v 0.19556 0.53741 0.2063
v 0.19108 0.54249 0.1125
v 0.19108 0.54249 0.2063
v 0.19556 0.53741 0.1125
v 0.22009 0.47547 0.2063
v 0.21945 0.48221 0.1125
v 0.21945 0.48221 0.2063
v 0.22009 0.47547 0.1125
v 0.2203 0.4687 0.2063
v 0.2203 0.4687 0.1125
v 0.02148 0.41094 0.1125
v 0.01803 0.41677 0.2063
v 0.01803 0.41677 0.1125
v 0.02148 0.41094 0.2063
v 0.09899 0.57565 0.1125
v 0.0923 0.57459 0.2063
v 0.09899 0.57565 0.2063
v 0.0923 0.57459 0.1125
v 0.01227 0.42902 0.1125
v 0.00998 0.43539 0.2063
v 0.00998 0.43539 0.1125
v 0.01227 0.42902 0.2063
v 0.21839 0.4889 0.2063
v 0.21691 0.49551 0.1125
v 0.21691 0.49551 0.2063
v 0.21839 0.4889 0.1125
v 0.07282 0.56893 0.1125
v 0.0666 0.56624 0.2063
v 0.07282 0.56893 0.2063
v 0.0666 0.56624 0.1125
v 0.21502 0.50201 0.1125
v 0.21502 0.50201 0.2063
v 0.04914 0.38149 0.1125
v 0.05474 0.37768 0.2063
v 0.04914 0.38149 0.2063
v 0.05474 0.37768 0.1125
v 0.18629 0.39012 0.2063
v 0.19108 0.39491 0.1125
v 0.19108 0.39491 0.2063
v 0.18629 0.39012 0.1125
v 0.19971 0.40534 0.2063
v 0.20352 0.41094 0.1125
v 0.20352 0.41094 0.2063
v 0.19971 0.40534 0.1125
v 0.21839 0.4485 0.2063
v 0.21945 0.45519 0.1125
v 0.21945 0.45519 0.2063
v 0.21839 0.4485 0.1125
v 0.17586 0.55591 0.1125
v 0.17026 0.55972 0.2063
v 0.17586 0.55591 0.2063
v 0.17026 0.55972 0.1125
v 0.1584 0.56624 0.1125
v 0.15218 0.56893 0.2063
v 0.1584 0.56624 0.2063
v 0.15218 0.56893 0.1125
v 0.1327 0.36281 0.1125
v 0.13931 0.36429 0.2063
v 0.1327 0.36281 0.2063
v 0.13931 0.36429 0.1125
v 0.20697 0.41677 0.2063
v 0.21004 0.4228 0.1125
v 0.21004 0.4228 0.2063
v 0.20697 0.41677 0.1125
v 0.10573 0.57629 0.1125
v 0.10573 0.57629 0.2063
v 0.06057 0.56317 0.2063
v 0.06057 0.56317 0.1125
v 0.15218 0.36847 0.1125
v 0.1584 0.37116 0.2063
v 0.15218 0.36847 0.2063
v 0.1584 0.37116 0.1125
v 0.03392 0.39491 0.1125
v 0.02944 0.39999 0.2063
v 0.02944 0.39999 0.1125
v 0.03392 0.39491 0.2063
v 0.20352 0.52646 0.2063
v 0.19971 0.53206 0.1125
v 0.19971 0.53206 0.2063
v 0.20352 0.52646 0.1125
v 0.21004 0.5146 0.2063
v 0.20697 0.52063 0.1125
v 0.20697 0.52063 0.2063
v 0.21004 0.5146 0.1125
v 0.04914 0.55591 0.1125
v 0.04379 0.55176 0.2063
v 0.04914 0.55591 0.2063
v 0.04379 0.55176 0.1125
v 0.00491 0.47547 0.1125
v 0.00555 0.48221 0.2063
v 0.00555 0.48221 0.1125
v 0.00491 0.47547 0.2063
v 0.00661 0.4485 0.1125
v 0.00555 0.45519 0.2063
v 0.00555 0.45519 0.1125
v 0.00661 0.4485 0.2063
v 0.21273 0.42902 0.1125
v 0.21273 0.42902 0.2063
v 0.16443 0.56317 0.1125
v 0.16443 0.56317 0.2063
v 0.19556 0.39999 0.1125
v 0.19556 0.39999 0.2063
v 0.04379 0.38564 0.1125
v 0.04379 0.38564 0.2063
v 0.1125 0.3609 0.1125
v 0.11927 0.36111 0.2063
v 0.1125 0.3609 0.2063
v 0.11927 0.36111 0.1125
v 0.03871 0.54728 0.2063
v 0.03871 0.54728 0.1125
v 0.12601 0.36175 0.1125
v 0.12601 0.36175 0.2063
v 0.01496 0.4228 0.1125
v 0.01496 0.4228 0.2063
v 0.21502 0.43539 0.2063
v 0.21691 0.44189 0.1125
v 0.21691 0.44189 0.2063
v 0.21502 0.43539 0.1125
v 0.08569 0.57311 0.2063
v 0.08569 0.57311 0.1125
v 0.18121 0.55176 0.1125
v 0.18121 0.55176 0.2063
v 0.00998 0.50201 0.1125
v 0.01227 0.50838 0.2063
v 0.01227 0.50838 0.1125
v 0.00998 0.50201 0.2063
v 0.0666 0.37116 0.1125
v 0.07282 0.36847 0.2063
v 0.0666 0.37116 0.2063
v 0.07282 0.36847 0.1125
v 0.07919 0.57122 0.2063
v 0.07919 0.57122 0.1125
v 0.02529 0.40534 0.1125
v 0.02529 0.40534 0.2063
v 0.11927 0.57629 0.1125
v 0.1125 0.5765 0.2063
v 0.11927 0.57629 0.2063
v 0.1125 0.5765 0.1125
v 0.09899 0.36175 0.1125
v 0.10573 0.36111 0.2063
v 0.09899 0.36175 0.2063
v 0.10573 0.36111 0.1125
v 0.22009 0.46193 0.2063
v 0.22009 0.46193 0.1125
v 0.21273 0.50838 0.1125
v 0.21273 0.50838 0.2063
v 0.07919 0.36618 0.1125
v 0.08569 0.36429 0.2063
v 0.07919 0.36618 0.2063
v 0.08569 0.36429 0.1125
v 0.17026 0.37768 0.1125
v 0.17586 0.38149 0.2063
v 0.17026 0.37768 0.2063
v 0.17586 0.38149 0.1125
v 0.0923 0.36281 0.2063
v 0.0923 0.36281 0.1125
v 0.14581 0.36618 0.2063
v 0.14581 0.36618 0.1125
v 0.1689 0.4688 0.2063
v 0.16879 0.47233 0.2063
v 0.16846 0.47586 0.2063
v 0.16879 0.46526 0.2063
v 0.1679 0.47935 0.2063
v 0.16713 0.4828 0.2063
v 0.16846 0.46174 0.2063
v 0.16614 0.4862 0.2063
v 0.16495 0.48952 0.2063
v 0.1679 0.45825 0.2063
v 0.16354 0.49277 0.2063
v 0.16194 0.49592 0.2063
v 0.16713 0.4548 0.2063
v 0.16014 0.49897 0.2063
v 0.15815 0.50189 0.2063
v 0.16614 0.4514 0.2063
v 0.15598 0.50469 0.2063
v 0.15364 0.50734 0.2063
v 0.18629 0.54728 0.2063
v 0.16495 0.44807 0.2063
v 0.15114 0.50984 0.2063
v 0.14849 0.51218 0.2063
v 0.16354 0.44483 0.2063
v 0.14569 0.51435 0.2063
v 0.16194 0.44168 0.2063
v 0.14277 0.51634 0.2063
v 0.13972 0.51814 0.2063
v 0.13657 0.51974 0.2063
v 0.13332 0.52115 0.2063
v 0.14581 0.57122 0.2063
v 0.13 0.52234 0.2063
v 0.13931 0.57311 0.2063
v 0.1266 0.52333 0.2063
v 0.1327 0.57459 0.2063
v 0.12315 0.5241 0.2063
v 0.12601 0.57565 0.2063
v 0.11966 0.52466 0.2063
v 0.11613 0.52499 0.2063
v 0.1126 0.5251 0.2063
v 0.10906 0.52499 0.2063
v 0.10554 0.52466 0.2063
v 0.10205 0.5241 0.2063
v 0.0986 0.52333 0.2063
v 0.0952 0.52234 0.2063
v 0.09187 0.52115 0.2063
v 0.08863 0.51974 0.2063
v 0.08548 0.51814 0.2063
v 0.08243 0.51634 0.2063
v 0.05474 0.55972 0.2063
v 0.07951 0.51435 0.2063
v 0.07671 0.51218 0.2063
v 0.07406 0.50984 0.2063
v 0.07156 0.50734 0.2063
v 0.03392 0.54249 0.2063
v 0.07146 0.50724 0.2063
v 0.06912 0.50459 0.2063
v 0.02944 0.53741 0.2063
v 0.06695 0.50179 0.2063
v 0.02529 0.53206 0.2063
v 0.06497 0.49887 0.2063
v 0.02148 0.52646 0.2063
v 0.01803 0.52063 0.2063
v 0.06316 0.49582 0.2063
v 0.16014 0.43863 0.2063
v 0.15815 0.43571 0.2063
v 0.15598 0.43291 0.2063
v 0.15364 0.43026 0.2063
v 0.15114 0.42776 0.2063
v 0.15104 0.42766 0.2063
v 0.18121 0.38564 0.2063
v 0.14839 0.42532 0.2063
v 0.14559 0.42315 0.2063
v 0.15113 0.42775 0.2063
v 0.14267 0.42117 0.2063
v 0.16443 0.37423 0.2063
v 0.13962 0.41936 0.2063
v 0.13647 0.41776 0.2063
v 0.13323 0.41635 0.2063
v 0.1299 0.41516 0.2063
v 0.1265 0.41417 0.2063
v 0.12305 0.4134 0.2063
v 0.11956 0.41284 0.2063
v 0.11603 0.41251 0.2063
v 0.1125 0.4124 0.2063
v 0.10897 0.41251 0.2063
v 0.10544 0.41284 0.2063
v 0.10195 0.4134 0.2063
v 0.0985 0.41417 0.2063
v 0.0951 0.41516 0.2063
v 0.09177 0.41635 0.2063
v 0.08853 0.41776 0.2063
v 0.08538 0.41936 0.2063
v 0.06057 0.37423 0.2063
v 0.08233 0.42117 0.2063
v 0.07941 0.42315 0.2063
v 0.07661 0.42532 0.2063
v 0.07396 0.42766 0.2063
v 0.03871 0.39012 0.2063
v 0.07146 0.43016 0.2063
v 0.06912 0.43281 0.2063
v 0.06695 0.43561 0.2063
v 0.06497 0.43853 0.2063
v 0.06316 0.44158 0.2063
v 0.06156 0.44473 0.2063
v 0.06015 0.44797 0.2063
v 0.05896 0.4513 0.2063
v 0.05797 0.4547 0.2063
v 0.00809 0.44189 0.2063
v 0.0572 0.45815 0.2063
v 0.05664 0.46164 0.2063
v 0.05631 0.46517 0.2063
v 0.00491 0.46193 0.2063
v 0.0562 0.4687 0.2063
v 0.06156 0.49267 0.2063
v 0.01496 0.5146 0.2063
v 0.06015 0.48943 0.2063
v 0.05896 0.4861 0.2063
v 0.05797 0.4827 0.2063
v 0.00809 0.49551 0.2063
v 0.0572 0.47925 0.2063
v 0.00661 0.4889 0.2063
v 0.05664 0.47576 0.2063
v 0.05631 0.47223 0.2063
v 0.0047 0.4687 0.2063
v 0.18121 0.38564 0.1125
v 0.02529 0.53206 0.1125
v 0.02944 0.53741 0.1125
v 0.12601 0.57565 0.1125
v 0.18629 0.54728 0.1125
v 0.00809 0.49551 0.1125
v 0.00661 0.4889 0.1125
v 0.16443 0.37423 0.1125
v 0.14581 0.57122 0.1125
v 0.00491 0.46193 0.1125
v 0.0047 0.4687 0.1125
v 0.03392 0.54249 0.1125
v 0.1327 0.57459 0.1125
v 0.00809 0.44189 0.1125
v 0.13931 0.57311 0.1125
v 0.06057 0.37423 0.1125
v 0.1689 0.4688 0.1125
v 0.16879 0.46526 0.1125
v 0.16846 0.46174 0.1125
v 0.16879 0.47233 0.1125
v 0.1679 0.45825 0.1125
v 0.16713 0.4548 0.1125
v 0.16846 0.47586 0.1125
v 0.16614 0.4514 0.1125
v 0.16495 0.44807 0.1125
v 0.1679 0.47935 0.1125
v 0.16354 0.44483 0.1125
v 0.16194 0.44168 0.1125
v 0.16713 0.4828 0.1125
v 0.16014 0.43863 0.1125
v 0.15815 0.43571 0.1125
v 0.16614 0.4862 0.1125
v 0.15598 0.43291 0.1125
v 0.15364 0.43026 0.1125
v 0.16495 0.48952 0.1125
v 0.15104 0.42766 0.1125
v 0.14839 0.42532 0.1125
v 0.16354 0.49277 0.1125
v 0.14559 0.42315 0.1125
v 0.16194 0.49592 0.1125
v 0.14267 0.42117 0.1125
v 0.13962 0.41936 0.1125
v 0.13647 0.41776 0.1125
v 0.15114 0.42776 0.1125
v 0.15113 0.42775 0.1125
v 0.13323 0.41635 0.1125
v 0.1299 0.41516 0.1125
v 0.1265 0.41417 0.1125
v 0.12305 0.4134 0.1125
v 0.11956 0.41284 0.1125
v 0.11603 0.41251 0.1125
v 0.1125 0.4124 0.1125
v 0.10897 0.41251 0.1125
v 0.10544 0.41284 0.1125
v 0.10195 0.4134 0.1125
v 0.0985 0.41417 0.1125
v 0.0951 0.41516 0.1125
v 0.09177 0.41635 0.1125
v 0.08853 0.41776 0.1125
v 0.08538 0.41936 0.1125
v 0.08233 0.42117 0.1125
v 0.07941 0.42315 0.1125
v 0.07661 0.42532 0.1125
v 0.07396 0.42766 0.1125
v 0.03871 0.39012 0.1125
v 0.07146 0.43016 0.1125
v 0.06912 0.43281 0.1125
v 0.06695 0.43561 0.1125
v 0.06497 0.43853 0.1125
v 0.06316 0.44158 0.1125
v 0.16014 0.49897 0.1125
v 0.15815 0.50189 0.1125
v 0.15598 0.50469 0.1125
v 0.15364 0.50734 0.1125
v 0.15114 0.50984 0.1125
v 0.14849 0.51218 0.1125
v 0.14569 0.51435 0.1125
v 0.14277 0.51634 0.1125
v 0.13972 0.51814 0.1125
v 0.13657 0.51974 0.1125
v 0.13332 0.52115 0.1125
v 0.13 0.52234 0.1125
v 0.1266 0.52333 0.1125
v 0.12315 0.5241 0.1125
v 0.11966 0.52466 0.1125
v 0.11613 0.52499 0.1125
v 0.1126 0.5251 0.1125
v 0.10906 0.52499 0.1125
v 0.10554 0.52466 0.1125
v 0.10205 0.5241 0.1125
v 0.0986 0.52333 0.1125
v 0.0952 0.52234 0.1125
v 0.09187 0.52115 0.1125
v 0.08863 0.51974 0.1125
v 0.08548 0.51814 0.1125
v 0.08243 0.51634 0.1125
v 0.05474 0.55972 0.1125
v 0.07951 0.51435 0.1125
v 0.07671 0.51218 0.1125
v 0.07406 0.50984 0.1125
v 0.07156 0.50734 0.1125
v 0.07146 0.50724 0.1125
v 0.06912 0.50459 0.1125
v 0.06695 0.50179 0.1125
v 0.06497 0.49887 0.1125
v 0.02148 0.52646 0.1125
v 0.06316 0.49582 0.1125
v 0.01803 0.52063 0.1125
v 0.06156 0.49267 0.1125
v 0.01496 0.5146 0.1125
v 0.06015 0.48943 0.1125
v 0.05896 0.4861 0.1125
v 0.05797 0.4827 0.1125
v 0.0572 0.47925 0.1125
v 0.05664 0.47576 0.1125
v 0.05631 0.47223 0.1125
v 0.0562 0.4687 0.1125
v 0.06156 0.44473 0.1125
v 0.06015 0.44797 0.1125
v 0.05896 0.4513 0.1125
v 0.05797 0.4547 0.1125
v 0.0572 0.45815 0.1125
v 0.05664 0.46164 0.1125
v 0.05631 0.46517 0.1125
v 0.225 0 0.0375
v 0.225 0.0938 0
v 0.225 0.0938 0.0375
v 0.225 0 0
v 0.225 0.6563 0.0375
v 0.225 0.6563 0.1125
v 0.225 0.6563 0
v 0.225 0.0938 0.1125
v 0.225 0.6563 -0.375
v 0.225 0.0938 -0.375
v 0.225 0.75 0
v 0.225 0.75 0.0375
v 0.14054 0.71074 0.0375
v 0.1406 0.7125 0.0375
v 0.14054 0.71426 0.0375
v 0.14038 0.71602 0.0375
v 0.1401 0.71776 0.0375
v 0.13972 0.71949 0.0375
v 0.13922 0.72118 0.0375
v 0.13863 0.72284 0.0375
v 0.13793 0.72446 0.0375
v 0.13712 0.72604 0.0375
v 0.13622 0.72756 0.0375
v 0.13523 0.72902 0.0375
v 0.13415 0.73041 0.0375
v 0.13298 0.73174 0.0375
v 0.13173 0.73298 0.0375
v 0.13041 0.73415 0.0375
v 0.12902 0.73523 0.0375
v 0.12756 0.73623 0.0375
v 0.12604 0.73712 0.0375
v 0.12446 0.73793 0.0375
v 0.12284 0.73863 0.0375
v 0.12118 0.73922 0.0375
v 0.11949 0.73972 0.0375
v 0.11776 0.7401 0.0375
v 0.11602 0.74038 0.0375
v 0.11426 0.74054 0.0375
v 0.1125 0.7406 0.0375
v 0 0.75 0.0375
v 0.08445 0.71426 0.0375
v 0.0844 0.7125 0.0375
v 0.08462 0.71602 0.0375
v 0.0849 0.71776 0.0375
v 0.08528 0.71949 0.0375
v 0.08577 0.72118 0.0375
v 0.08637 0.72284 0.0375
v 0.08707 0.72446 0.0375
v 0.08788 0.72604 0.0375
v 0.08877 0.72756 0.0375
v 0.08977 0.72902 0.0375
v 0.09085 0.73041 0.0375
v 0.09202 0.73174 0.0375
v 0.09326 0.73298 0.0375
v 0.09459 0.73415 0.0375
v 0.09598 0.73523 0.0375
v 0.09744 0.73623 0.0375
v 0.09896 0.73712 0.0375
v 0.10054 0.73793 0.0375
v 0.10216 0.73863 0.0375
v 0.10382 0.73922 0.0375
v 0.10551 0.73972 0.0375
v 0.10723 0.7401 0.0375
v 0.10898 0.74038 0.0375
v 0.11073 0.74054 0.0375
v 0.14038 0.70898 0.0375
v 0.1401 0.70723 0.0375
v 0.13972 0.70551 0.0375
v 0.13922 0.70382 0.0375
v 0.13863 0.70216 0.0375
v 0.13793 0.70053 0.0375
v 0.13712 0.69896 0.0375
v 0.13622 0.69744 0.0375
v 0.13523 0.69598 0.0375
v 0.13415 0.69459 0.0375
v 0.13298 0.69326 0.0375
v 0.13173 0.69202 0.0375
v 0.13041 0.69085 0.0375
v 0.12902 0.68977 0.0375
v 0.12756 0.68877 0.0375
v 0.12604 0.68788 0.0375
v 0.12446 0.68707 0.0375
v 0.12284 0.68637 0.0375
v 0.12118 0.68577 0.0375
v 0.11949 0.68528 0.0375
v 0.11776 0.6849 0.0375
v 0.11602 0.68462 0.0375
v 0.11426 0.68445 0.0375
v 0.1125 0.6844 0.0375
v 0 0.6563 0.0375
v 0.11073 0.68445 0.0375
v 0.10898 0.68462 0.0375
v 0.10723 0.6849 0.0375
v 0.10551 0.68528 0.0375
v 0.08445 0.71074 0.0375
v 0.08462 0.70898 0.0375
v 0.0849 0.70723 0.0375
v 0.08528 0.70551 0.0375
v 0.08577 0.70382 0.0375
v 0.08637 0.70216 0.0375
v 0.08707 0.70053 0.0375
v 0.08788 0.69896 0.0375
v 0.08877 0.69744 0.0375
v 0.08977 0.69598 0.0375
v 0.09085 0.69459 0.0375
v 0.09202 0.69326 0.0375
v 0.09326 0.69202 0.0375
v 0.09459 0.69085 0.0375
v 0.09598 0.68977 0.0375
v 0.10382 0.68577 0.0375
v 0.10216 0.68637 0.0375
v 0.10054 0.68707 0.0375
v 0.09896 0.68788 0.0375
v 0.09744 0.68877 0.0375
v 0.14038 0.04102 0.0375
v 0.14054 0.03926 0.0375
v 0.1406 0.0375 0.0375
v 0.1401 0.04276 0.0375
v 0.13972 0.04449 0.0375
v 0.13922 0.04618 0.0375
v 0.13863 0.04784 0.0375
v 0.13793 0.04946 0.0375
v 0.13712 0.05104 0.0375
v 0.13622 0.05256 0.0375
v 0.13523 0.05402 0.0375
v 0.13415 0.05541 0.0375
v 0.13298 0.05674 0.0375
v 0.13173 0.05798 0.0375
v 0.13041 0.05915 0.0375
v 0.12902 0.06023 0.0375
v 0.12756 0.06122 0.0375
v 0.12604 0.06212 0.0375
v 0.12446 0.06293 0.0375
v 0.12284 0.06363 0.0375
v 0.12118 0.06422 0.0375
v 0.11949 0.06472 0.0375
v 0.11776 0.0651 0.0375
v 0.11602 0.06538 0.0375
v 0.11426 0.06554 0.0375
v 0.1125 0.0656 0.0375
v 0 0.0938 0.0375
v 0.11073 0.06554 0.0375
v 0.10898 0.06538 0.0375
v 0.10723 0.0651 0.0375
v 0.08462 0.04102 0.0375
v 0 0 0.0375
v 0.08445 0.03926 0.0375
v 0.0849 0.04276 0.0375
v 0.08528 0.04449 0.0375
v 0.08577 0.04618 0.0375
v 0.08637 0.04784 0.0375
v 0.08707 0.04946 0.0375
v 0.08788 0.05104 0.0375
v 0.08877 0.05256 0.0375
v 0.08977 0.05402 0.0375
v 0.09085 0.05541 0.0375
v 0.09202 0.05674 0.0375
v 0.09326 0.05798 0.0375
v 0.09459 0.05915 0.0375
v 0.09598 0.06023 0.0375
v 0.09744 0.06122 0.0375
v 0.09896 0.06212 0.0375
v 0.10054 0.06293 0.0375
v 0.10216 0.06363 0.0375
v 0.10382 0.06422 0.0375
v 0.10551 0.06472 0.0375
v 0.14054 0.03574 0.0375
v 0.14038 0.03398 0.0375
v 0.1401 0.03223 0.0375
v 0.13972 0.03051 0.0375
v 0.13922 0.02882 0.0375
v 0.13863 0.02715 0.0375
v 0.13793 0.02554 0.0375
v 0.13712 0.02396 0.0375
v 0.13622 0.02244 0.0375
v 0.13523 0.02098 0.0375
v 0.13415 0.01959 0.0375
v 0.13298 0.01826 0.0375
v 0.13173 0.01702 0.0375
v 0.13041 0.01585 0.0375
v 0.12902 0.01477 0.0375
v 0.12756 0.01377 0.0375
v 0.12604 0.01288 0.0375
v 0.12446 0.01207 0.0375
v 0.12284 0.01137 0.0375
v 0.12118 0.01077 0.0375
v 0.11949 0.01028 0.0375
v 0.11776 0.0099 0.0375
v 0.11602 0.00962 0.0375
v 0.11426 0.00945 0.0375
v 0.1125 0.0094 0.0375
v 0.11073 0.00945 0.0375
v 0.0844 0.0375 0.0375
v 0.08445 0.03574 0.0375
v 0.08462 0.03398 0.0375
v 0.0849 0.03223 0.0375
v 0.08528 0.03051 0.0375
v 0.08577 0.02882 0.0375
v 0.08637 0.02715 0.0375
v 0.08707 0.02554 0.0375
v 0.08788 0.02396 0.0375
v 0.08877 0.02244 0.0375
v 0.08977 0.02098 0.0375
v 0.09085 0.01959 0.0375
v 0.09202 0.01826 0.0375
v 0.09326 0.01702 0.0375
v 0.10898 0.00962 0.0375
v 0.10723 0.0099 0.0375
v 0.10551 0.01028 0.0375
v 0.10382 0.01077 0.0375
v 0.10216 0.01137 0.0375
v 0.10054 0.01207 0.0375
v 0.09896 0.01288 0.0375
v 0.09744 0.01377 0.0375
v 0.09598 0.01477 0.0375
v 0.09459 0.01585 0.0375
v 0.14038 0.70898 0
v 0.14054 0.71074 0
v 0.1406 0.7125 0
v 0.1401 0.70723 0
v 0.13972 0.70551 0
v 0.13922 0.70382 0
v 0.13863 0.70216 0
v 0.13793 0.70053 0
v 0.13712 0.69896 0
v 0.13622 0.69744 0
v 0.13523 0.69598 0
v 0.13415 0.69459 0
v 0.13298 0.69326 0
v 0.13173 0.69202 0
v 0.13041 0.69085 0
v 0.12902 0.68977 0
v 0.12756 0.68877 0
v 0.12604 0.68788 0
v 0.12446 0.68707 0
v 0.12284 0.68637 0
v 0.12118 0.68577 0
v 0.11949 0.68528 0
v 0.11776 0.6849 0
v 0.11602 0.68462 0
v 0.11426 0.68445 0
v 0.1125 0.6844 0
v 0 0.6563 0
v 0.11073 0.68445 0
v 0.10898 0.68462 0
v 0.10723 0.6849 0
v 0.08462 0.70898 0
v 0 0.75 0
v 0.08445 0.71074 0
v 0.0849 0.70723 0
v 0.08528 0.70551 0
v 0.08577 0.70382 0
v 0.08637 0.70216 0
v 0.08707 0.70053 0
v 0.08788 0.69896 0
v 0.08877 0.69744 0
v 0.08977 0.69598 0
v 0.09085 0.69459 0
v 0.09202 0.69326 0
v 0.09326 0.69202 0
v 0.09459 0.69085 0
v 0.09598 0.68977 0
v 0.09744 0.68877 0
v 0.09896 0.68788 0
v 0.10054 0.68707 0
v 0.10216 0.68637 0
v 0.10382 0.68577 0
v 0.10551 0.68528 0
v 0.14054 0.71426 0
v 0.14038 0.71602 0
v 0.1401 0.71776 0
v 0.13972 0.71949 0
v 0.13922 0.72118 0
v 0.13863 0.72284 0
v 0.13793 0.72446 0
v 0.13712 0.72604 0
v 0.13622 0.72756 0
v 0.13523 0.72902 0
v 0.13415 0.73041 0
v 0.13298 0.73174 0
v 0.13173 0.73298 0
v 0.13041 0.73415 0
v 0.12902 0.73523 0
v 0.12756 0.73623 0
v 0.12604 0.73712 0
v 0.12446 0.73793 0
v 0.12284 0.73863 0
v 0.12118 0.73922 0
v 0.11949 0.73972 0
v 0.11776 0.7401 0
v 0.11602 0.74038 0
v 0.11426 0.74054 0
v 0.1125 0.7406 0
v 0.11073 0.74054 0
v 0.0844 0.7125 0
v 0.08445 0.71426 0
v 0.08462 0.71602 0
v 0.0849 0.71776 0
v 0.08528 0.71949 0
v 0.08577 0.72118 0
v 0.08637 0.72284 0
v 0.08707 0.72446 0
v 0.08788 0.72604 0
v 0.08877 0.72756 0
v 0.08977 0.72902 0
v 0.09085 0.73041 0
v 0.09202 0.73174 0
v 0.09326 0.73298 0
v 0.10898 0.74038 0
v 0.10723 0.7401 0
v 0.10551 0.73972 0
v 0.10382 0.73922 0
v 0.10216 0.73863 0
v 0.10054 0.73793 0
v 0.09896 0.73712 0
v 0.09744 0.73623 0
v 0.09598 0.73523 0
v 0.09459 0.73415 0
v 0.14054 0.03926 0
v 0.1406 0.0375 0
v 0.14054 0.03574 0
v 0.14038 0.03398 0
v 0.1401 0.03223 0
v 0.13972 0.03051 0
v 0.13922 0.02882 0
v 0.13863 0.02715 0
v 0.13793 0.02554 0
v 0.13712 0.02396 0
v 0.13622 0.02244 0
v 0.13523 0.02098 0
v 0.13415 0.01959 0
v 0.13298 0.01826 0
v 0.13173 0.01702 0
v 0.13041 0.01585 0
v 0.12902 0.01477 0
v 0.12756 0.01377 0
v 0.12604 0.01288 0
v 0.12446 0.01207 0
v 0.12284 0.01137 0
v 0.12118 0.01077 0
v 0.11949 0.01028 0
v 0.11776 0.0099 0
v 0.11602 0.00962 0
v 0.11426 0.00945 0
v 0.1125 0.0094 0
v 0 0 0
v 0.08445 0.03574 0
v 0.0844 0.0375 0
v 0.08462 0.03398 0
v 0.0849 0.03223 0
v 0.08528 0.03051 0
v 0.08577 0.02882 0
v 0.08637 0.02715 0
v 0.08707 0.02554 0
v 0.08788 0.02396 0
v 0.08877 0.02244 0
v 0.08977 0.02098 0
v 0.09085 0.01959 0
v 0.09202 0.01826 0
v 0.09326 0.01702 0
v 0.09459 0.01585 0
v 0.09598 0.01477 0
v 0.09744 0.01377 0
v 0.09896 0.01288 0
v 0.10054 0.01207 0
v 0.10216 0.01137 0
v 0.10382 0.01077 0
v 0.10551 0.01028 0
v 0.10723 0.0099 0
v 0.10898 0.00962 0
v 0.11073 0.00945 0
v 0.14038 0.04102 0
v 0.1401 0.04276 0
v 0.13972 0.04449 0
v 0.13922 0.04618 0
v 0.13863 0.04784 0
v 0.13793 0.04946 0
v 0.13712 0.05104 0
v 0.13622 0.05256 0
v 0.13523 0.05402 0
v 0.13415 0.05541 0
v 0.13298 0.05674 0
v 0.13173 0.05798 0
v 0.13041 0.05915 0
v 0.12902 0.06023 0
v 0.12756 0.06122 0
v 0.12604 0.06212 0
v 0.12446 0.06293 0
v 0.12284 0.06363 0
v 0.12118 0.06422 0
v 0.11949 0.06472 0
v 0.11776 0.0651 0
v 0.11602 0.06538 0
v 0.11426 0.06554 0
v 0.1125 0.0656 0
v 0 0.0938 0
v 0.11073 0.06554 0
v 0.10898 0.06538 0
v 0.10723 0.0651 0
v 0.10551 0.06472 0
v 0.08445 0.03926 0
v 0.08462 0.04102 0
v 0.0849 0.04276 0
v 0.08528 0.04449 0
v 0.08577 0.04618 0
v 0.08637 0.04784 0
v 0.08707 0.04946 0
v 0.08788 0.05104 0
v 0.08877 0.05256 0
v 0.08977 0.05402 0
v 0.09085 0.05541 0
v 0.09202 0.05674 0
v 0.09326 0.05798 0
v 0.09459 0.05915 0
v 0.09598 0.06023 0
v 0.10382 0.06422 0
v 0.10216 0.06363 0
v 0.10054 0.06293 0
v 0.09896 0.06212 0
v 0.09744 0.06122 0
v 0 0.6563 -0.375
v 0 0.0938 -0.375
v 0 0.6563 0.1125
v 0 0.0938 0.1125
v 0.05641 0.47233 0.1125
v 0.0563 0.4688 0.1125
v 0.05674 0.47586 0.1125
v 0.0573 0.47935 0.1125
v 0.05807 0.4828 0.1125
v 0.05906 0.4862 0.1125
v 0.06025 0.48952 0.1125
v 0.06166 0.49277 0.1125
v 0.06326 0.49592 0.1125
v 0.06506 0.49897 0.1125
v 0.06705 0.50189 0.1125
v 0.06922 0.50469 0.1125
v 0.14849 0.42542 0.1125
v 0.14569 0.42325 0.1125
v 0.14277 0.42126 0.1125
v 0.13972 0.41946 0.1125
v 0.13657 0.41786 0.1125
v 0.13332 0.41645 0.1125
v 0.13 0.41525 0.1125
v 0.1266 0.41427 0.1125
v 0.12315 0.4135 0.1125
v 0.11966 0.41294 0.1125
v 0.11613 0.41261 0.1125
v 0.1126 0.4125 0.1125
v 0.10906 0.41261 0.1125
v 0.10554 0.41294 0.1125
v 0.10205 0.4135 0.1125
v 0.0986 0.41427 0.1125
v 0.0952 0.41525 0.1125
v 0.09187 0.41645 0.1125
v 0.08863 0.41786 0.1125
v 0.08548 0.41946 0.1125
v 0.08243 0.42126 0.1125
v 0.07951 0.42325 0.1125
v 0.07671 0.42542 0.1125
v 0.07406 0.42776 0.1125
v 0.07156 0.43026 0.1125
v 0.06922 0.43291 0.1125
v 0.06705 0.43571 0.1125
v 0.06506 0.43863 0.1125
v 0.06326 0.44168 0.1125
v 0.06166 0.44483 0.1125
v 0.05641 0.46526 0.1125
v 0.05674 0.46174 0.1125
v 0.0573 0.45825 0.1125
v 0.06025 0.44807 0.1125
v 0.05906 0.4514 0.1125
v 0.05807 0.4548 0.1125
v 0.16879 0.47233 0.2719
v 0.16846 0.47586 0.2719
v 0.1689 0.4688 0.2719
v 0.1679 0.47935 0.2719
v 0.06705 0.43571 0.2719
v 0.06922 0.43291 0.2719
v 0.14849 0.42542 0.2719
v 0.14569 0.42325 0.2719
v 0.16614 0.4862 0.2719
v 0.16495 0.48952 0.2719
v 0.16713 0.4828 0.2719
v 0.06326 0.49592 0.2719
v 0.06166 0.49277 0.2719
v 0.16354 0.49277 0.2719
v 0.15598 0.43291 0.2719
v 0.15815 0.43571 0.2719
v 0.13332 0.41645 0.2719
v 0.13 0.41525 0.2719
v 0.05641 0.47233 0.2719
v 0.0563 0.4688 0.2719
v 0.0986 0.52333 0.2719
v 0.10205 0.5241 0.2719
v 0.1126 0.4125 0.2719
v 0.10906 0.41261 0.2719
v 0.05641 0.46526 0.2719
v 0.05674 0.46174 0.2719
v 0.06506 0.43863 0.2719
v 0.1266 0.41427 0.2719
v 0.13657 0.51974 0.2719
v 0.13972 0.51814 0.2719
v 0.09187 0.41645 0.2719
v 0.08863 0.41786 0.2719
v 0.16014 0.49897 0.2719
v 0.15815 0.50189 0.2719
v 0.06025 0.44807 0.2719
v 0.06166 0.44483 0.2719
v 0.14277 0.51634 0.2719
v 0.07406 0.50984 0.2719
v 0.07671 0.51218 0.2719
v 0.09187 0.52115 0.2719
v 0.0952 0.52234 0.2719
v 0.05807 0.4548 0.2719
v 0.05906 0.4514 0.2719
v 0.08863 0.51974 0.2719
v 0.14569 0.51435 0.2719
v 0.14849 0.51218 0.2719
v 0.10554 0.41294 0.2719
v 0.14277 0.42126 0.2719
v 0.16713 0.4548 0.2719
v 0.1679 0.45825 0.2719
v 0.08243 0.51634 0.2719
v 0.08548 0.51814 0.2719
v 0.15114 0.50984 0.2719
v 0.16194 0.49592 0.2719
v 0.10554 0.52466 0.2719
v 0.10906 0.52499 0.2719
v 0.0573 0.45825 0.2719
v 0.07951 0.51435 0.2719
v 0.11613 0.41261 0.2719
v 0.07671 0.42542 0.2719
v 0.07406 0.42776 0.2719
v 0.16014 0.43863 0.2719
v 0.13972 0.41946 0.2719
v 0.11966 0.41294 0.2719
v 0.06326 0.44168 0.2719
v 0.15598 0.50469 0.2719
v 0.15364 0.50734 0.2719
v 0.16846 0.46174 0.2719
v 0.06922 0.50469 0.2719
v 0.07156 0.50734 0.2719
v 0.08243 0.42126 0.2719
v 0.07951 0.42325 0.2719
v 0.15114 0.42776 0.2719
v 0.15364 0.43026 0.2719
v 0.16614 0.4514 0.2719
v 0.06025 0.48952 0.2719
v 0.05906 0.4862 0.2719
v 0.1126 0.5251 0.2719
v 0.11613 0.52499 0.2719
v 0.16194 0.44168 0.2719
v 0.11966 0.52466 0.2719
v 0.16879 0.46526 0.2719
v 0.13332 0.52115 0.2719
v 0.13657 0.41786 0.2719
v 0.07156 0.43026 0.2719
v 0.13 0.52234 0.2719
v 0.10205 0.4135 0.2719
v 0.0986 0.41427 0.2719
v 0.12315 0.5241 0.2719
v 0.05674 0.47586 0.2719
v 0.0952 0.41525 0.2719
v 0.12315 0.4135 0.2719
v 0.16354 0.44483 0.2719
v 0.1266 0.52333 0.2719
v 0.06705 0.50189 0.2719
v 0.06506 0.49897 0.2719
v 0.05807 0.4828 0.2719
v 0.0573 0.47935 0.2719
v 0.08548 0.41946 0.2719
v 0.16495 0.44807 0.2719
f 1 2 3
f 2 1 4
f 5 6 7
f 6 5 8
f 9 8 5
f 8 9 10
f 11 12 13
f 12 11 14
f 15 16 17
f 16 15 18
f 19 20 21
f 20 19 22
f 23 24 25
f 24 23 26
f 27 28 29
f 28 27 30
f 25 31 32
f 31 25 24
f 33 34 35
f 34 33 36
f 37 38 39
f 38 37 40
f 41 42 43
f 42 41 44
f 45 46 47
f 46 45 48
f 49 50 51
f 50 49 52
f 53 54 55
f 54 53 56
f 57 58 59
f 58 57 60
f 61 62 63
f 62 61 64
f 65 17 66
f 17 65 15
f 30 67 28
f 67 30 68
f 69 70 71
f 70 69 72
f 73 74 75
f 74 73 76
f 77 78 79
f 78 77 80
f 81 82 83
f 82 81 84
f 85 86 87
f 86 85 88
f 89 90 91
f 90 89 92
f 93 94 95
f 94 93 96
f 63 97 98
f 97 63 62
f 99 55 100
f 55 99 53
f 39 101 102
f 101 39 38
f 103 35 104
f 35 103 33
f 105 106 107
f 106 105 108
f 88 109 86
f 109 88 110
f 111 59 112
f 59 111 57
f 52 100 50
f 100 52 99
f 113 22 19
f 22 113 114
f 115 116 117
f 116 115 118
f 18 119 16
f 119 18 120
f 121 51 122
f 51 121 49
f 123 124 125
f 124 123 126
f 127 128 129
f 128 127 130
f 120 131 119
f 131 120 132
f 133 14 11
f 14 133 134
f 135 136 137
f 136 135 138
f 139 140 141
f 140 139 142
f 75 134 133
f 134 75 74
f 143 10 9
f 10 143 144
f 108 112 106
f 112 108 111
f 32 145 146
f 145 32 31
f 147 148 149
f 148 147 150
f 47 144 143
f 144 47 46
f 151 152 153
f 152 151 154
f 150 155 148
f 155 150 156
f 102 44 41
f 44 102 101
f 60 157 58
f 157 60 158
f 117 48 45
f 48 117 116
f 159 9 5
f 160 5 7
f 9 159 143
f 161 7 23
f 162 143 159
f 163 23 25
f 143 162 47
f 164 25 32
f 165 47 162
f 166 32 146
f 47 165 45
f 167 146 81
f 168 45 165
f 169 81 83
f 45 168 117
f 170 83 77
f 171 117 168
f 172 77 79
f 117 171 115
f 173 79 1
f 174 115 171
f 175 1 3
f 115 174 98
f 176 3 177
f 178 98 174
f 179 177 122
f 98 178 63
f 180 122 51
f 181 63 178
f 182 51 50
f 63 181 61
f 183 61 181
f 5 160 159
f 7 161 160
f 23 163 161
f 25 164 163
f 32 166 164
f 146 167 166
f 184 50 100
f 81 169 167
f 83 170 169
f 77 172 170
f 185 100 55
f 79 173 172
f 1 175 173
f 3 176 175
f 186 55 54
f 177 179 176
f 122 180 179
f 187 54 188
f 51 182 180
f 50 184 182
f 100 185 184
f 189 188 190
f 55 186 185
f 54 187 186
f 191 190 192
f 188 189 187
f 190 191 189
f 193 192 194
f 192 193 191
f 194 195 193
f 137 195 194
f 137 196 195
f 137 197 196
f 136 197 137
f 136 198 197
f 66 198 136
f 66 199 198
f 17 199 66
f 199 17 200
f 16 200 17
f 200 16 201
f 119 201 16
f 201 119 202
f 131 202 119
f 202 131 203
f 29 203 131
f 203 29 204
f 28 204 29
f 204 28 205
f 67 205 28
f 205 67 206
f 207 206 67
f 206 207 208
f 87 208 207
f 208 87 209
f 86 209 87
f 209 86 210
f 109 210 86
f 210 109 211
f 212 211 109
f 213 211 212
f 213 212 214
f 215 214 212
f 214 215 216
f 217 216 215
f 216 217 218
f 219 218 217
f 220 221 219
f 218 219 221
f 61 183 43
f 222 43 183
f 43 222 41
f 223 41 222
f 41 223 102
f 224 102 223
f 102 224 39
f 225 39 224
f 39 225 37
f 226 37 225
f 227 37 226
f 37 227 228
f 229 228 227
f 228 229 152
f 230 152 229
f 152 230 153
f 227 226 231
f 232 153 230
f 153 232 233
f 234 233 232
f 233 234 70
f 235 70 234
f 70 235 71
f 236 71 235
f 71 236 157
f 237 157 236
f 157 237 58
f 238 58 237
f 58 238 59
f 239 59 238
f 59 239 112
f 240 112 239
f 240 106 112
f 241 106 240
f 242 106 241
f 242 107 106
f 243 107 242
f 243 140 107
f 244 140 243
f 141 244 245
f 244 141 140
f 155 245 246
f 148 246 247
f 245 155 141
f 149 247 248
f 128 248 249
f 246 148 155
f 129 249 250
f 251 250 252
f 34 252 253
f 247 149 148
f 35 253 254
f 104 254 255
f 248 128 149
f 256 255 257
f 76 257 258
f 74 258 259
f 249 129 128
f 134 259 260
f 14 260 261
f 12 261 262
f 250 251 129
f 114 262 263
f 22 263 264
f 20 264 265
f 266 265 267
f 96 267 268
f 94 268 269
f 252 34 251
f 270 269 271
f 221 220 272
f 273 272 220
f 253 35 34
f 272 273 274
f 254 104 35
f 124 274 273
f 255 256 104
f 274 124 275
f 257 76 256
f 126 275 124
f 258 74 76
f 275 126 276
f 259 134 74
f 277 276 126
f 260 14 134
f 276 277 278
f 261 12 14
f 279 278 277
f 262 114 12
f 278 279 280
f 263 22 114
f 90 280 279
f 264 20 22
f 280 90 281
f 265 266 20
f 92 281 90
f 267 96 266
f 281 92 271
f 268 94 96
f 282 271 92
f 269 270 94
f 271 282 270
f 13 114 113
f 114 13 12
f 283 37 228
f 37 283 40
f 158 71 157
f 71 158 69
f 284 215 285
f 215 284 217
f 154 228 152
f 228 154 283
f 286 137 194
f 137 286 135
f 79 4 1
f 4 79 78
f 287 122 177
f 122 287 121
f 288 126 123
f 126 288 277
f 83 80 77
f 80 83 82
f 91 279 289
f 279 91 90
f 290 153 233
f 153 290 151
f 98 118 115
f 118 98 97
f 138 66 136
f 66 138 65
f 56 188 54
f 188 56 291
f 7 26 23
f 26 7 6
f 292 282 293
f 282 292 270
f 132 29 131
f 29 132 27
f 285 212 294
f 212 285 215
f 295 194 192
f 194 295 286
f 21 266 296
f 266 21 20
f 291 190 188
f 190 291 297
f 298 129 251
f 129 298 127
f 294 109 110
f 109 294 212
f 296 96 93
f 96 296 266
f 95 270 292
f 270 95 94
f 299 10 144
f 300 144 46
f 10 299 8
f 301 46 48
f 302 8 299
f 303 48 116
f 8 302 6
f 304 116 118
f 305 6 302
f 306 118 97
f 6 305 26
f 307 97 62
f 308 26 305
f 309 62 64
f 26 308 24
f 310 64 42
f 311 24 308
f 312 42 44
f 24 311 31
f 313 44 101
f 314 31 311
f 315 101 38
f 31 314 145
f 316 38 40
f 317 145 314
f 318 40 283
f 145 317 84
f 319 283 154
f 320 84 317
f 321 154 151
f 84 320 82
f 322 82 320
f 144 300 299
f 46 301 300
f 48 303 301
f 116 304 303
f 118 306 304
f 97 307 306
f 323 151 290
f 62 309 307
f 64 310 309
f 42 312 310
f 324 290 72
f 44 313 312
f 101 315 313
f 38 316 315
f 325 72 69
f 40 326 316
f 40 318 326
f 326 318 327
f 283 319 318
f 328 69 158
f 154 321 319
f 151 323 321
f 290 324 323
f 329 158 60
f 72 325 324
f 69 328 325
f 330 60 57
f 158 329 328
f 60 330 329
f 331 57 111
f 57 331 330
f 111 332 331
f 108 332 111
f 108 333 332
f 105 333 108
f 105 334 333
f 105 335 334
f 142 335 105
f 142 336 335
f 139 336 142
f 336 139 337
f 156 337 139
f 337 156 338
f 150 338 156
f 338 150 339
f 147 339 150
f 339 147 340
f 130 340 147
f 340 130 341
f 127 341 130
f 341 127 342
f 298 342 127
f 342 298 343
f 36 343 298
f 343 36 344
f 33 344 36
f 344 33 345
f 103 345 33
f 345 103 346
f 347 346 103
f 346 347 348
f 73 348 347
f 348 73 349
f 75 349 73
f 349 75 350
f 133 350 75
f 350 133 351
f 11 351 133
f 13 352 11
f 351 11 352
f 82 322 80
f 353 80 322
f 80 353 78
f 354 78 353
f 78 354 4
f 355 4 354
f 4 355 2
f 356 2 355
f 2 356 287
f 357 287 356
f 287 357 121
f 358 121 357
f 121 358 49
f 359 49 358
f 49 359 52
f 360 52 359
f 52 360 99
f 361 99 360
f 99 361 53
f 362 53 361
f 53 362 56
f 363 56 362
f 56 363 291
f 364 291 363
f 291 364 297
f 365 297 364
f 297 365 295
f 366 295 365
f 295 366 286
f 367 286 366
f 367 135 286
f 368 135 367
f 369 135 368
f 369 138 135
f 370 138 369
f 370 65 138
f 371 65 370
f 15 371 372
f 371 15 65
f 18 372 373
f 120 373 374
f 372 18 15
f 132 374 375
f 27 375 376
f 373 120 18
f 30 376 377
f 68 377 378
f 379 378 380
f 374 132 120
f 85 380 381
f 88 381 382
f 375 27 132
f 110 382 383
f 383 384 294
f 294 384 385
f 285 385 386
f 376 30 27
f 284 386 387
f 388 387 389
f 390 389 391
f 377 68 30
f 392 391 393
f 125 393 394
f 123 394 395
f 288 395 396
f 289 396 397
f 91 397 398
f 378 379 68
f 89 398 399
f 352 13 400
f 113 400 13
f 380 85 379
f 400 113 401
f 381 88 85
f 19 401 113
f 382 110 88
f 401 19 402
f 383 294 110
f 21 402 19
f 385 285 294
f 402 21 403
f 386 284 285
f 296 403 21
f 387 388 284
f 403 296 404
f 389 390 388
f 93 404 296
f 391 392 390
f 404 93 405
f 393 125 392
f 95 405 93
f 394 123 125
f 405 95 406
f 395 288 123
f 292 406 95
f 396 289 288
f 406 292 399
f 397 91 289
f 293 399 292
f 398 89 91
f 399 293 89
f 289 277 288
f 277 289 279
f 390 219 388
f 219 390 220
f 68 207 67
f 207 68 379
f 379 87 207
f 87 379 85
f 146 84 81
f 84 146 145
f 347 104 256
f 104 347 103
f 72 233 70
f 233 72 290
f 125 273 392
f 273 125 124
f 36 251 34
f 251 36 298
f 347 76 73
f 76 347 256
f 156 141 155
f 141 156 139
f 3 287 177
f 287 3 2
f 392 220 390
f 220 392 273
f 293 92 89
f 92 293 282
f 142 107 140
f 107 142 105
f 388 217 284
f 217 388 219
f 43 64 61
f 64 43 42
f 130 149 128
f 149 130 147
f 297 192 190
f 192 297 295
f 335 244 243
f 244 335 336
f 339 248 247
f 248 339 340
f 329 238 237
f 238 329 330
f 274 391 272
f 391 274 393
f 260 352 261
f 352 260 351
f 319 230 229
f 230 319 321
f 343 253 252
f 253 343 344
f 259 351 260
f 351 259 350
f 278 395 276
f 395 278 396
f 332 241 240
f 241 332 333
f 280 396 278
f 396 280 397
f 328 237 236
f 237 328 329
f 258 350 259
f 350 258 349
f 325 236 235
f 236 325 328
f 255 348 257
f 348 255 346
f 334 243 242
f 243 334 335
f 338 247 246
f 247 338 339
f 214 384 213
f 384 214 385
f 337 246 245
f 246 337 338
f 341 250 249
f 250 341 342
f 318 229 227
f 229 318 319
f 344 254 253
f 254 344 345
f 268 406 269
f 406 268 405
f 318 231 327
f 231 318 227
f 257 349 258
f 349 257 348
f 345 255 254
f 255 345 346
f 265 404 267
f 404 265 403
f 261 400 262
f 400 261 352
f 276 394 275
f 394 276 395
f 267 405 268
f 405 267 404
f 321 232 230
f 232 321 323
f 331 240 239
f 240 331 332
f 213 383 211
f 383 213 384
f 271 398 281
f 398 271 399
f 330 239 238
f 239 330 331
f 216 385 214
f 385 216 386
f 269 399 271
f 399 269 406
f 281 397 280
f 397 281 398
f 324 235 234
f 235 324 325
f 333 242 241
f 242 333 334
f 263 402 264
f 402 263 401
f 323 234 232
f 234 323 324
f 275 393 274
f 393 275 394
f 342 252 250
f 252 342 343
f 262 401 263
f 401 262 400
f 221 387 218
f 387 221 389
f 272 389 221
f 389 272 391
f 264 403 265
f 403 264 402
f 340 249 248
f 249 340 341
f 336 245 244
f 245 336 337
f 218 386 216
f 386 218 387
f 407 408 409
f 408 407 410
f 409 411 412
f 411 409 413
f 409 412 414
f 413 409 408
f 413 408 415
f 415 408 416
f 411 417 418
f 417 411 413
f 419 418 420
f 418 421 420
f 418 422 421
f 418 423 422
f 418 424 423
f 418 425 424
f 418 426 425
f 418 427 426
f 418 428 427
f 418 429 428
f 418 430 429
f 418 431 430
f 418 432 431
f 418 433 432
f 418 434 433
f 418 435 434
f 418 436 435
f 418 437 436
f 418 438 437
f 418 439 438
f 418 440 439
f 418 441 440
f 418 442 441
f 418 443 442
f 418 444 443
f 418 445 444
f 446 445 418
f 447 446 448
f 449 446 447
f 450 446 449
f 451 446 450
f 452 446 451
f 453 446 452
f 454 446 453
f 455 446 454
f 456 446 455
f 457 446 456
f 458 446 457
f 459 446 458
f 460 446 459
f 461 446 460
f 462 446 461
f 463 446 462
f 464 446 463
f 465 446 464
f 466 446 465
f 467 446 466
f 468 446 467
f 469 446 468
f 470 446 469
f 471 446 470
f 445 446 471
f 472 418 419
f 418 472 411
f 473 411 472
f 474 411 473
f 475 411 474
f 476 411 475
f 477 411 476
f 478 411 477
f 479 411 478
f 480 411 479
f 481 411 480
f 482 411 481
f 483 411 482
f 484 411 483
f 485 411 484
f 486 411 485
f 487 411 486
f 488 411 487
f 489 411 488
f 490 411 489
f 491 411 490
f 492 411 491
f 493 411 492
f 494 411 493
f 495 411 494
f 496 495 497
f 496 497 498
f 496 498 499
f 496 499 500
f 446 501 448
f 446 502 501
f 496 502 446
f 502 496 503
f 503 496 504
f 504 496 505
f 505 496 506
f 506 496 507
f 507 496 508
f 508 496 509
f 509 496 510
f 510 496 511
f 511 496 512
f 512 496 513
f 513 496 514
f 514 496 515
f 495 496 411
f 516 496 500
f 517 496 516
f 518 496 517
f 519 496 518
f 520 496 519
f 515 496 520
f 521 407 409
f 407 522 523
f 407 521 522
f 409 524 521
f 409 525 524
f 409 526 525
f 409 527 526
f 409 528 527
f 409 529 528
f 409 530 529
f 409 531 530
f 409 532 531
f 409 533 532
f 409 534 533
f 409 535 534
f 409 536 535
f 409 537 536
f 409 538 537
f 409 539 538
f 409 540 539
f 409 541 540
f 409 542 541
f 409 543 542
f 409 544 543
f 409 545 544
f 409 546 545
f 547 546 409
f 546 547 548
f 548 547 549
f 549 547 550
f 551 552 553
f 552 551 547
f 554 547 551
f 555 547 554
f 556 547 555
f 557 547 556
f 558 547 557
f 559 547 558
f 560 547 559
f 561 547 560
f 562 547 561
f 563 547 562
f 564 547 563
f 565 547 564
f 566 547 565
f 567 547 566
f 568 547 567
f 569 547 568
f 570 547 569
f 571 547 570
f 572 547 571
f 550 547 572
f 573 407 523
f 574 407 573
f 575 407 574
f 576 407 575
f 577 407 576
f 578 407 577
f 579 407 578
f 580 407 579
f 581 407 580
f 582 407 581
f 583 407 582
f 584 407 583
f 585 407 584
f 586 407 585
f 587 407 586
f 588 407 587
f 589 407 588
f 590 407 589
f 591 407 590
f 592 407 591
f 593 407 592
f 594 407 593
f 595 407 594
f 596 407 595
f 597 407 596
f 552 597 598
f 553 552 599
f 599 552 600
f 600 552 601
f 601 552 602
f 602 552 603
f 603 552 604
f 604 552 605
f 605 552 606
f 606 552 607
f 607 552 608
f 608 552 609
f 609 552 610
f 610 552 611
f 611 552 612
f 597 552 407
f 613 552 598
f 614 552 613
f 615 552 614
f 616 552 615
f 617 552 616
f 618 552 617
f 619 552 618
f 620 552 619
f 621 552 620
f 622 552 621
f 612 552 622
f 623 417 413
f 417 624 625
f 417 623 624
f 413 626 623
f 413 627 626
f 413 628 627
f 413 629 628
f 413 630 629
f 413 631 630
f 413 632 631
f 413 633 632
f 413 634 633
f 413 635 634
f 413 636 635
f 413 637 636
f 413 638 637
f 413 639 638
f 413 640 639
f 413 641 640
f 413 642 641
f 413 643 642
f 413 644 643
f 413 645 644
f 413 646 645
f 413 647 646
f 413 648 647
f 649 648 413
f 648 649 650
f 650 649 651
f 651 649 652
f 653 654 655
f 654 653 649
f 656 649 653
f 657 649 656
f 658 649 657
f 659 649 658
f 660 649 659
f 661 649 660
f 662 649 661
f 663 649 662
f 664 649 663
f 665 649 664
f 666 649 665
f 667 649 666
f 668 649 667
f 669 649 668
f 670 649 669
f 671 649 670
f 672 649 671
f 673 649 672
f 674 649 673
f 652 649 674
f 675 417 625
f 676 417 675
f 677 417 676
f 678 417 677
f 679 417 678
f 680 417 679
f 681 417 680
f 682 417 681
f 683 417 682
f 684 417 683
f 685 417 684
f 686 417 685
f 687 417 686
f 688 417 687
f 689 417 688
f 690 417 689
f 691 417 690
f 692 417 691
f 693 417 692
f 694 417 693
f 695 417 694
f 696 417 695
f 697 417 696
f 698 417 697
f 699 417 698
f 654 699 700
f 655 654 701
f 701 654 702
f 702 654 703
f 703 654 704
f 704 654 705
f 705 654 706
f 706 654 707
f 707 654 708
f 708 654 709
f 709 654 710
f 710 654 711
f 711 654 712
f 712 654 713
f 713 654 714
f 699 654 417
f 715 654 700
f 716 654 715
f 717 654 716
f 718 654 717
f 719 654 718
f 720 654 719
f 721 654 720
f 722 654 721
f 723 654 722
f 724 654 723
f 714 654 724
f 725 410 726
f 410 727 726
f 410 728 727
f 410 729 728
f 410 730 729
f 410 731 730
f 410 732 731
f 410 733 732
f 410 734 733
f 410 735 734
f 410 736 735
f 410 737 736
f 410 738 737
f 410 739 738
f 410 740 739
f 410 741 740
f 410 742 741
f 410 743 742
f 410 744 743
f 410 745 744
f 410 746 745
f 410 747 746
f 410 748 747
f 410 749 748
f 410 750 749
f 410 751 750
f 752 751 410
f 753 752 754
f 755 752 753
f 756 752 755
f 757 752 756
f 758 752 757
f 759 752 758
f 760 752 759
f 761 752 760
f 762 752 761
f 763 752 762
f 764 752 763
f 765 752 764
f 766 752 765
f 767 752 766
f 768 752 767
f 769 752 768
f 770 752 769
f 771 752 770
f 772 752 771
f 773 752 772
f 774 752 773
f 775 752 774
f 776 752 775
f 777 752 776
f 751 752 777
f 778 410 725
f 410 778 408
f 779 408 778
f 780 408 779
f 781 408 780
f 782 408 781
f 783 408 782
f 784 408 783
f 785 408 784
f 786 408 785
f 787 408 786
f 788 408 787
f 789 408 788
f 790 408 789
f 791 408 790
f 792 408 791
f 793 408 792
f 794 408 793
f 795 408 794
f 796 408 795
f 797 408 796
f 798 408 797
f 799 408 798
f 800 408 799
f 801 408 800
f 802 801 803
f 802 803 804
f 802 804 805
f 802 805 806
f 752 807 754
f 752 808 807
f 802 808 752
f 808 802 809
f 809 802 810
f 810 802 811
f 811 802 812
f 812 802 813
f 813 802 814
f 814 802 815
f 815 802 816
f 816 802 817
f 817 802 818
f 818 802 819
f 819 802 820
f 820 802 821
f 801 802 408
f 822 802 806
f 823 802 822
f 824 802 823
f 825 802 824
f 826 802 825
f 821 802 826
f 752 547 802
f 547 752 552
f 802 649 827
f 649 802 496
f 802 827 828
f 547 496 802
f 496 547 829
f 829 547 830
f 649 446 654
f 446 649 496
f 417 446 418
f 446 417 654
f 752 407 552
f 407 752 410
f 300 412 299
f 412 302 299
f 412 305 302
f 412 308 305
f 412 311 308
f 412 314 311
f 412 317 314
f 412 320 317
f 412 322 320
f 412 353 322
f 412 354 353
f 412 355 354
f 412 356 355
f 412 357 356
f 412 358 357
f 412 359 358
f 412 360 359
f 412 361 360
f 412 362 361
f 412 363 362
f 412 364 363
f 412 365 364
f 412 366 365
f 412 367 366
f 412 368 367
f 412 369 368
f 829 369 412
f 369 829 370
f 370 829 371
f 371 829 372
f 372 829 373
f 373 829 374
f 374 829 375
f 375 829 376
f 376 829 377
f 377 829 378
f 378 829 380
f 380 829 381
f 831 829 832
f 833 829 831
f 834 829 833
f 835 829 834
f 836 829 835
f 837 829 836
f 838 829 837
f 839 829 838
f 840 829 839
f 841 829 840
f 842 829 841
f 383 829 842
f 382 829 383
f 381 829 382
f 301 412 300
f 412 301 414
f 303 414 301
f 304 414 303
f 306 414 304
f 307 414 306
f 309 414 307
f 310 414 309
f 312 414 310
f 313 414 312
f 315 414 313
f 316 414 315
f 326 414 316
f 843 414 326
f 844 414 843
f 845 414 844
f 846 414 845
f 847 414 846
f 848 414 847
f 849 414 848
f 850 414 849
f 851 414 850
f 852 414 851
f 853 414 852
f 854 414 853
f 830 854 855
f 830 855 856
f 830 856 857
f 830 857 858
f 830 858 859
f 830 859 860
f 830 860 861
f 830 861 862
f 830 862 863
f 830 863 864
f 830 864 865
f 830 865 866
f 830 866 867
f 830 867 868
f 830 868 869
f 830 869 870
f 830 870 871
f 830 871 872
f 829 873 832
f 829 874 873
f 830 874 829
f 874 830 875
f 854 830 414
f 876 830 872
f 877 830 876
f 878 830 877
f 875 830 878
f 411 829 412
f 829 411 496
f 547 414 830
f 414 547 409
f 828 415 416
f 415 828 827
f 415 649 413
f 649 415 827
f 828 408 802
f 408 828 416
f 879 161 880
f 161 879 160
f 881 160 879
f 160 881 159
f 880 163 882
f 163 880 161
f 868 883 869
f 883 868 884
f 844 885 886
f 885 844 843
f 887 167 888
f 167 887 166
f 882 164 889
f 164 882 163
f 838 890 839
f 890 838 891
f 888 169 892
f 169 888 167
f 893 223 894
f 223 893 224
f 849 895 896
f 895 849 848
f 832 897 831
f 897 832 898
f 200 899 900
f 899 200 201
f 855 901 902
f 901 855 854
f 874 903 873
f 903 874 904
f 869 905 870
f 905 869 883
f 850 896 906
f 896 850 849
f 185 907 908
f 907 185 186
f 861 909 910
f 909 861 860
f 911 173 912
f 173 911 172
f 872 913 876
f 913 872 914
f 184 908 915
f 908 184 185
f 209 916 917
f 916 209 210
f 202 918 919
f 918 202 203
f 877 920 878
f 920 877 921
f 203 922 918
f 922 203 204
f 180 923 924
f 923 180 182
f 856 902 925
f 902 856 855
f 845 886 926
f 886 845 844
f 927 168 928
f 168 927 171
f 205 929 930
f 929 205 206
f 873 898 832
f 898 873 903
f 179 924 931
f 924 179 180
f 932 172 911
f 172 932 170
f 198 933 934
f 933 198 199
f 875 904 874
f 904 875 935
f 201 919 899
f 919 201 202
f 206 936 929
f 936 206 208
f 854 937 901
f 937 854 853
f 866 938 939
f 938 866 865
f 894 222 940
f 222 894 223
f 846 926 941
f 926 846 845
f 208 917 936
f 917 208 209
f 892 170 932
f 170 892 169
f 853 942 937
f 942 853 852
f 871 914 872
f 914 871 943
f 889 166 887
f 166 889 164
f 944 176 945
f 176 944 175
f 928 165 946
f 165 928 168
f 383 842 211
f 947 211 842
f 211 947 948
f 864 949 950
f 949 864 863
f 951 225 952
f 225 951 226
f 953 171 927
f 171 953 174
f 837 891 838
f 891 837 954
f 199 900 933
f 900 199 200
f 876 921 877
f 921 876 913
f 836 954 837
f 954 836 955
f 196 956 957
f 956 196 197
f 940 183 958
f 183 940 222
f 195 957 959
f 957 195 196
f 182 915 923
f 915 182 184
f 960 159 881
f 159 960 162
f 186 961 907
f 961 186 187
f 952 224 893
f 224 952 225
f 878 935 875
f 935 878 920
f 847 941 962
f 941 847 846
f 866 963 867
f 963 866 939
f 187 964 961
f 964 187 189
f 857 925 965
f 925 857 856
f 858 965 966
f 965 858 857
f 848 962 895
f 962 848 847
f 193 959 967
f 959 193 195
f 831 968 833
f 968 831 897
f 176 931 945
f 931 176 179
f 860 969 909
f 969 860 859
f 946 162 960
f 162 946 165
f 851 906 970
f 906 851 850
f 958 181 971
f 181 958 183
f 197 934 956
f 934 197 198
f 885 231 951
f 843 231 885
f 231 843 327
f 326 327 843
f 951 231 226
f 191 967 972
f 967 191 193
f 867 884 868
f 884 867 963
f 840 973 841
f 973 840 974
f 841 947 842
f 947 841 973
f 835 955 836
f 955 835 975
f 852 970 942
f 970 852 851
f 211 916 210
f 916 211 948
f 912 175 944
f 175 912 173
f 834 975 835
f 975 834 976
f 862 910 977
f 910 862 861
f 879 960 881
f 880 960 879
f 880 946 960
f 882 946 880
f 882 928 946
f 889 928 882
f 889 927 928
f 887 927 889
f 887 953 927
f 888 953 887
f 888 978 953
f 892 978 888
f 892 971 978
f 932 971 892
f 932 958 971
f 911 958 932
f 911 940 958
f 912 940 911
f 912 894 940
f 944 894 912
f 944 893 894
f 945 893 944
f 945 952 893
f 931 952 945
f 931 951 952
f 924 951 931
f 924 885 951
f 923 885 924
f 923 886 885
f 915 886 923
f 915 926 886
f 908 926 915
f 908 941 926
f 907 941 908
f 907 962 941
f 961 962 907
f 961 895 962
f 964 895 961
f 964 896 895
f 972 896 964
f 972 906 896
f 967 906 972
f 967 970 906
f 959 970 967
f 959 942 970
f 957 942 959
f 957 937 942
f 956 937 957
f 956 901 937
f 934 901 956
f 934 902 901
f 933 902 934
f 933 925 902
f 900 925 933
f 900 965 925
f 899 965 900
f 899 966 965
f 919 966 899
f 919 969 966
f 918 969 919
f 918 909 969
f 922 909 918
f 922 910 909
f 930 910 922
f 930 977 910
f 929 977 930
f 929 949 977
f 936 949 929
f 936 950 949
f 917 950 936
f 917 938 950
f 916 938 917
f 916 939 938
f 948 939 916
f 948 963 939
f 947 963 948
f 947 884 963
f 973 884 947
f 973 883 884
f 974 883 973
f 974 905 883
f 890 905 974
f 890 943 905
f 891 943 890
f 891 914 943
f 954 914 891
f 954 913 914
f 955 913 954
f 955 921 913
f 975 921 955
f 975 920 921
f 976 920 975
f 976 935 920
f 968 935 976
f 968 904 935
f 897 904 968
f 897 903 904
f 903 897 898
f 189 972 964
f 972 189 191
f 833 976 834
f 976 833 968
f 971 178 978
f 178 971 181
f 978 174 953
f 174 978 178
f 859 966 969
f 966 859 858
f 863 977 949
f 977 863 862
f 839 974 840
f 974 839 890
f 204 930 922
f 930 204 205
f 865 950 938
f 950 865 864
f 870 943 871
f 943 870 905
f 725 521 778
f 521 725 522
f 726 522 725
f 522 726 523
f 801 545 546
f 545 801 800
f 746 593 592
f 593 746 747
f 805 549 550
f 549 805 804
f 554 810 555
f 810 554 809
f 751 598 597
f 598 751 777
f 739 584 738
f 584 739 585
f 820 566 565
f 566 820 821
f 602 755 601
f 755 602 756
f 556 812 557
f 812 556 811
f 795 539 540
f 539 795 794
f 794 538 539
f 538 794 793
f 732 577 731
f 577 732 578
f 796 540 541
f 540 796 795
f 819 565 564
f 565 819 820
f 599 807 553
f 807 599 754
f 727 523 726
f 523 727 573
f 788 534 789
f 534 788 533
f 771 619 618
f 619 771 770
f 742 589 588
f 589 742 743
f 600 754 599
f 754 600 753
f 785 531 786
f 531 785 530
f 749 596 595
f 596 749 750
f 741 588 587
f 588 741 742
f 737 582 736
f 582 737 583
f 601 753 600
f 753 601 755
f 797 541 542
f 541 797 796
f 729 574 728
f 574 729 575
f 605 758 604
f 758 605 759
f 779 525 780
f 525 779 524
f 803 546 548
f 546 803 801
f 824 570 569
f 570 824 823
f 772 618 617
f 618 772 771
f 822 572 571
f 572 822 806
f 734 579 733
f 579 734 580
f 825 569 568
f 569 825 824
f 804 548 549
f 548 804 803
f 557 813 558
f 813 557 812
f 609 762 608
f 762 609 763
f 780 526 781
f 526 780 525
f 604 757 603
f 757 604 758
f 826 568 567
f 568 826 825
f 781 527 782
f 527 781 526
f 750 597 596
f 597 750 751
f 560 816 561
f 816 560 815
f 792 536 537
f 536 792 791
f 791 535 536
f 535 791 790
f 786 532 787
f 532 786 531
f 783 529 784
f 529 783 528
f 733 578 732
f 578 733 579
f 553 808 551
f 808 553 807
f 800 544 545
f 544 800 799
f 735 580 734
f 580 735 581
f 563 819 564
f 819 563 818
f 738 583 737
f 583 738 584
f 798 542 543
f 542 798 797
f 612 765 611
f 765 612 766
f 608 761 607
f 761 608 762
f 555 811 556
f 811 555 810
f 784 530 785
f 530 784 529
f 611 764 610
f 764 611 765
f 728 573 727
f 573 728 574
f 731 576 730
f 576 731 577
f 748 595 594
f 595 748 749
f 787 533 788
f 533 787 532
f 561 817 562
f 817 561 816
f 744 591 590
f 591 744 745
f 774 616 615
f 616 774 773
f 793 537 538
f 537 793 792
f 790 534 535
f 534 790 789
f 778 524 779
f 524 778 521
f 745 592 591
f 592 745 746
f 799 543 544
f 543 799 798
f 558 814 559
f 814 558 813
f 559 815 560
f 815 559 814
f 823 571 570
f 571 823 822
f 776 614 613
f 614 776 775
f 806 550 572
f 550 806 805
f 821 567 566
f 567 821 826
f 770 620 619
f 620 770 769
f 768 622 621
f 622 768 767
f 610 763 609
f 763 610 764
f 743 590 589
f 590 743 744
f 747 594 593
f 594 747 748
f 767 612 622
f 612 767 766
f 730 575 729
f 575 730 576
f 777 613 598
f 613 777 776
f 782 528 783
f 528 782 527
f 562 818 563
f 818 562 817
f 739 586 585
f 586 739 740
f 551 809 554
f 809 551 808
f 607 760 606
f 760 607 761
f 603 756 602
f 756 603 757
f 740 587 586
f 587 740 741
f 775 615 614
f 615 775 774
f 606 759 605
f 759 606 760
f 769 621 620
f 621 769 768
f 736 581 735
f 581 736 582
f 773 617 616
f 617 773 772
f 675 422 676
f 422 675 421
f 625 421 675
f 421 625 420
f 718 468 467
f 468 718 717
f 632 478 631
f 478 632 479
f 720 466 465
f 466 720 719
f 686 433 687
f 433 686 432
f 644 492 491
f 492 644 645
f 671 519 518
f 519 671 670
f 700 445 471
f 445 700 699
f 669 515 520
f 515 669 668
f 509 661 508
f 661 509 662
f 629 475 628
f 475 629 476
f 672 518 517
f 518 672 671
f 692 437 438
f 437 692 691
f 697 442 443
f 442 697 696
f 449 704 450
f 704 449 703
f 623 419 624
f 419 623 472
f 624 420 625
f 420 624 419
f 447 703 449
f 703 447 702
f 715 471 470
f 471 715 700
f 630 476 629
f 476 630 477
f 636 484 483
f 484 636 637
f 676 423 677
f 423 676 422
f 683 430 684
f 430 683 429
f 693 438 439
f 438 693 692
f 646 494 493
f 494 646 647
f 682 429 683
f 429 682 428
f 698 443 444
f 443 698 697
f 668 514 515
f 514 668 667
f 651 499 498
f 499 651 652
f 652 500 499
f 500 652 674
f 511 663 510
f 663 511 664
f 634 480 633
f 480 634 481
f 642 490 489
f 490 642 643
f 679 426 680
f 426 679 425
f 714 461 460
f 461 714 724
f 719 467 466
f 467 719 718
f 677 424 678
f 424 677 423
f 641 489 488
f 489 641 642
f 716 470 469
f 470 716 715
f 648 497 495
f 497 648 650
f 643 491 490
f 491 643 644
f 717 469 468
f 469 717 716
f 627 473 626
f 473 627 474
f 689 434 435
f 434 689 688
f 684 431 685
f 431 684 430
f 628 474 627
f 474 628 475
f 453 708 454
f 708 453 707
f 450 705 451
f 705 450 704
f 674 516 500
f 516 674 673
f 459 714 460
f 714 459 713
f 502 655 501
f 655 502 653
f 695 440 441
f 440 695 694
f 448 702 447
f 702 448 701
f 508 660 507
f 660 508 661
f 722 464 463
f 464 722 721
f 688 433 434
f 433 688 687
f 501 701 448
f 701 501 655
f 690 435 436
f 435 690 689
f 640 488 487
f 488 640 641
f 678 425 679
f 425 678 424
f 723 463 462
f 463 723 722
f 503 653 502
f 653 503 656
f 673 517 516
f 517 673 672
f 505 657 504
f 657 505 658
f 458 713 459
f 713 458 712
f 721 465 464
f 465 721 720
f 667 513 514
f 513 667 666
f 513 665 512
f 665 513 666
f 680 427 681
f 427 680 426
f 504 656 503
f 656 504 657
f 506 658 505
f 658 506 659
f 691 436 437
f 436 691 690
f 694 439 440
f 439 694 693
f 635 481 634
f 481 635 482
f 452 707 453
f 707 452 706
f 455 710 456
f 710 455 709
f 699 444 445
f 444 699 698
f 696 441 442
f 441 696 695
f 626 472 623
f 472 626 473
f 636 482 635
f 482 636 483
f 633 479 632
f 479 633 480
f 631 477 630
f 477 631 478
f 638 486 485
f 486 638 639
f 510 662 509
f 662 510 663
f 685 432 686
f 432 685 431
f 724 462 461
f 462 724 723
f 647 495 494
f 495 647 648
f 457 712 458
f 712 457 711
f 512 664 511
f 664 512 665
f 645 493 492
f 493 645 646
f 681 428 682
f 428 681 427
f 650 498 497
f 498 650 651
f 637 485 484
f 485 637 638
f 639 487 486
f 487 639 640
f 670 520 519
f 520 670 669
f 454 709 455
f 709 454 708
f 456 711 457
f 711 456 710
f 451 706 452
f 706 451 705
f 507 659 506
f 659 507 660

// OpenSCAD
// Parameters
$fn = 100;

// Main plate dimensions
plate_len = 0.225;
plate_wid = 0.75;
plate_thk = 0.0375;

// Through holes
hole_rad = 0.0281;
hole_x = 0.1125;
hole_y1 = 0.0375;
hole_y2 = 0.7125;

// Upper central rectangular solid
upper_h = 0.1125;
upper_w = 0.5625;
upper_front_off = 0.0938;

// Lower central rectangular solid
lower_h = 0.375;

// Annular boss (lower stepped section)
boss_r_out = 0.1078;
boss_r_in = 0.0563;
boss_h = 0.0938;
boss_x = 0.1125;
boss_y = 0.4687;

// Solid pin (upper stepped section)
pin_r = 0.0563;
pin_h = 0.1594;
pin_x = 0.1126;
pin_y = 0.4688;

// Derived reference values
shoulder_z = upper_h;
center_y = upper_front_off + upper_w / 2;

// Module: Base plate
module main_plate() {
    translate([plate_len/2, plate_wid/2, plate_thk/2])
        cube([plate_len, plate_wid, plate_thk], center=true);
}

// Module: Upper rectangular solid
module upper_rect() {
    translate([plate_len/2, center_y, upper_h/2])
        cube([plate_len, upper_w, upper_h], center=true);
}

// Module: Lower rectangular solid
module lower_rect() {
    translate([plate_len/2, center_y, -lower_h/2])
        cube([plate_len, upper_w, lower_h], center=true);
}

// Module: Annular boss (hollow ring)
module annular_boss() {
    translate([boss_x, boss_y, shoulder_z])
        difference() {
            cylinder(h=boss_h, r=boss_r_out, center=false);
            cylinder(h=boss_h + 0.01, r=boss_r_in, center=false);
        }
}

// Module: Solid pin
module solid_pin() {
    translate([pin_x, pin_y, shoulder_z])
        cylinder(h=pin_h, r=pin_r, center=false);
}

// Module: Plate through-holes
module through_holes() {
    translate([hole_x, hole_y1, plate_thk/2])
        cylinder(h=plate_thk + 0.02, r=hole_rad, center=true);
    translate([hole_x, hole_y2, plate_thk/2])
        cylinder(h=plate_thk + 0.02, r=hole_rad, center=true);
}

// Main assembly
difference() {
    union() {
        main_plate();
        upper_rect();
        lower_rect();
        annular_boss();
        solid_pin();
    }
    through_holes();
}
